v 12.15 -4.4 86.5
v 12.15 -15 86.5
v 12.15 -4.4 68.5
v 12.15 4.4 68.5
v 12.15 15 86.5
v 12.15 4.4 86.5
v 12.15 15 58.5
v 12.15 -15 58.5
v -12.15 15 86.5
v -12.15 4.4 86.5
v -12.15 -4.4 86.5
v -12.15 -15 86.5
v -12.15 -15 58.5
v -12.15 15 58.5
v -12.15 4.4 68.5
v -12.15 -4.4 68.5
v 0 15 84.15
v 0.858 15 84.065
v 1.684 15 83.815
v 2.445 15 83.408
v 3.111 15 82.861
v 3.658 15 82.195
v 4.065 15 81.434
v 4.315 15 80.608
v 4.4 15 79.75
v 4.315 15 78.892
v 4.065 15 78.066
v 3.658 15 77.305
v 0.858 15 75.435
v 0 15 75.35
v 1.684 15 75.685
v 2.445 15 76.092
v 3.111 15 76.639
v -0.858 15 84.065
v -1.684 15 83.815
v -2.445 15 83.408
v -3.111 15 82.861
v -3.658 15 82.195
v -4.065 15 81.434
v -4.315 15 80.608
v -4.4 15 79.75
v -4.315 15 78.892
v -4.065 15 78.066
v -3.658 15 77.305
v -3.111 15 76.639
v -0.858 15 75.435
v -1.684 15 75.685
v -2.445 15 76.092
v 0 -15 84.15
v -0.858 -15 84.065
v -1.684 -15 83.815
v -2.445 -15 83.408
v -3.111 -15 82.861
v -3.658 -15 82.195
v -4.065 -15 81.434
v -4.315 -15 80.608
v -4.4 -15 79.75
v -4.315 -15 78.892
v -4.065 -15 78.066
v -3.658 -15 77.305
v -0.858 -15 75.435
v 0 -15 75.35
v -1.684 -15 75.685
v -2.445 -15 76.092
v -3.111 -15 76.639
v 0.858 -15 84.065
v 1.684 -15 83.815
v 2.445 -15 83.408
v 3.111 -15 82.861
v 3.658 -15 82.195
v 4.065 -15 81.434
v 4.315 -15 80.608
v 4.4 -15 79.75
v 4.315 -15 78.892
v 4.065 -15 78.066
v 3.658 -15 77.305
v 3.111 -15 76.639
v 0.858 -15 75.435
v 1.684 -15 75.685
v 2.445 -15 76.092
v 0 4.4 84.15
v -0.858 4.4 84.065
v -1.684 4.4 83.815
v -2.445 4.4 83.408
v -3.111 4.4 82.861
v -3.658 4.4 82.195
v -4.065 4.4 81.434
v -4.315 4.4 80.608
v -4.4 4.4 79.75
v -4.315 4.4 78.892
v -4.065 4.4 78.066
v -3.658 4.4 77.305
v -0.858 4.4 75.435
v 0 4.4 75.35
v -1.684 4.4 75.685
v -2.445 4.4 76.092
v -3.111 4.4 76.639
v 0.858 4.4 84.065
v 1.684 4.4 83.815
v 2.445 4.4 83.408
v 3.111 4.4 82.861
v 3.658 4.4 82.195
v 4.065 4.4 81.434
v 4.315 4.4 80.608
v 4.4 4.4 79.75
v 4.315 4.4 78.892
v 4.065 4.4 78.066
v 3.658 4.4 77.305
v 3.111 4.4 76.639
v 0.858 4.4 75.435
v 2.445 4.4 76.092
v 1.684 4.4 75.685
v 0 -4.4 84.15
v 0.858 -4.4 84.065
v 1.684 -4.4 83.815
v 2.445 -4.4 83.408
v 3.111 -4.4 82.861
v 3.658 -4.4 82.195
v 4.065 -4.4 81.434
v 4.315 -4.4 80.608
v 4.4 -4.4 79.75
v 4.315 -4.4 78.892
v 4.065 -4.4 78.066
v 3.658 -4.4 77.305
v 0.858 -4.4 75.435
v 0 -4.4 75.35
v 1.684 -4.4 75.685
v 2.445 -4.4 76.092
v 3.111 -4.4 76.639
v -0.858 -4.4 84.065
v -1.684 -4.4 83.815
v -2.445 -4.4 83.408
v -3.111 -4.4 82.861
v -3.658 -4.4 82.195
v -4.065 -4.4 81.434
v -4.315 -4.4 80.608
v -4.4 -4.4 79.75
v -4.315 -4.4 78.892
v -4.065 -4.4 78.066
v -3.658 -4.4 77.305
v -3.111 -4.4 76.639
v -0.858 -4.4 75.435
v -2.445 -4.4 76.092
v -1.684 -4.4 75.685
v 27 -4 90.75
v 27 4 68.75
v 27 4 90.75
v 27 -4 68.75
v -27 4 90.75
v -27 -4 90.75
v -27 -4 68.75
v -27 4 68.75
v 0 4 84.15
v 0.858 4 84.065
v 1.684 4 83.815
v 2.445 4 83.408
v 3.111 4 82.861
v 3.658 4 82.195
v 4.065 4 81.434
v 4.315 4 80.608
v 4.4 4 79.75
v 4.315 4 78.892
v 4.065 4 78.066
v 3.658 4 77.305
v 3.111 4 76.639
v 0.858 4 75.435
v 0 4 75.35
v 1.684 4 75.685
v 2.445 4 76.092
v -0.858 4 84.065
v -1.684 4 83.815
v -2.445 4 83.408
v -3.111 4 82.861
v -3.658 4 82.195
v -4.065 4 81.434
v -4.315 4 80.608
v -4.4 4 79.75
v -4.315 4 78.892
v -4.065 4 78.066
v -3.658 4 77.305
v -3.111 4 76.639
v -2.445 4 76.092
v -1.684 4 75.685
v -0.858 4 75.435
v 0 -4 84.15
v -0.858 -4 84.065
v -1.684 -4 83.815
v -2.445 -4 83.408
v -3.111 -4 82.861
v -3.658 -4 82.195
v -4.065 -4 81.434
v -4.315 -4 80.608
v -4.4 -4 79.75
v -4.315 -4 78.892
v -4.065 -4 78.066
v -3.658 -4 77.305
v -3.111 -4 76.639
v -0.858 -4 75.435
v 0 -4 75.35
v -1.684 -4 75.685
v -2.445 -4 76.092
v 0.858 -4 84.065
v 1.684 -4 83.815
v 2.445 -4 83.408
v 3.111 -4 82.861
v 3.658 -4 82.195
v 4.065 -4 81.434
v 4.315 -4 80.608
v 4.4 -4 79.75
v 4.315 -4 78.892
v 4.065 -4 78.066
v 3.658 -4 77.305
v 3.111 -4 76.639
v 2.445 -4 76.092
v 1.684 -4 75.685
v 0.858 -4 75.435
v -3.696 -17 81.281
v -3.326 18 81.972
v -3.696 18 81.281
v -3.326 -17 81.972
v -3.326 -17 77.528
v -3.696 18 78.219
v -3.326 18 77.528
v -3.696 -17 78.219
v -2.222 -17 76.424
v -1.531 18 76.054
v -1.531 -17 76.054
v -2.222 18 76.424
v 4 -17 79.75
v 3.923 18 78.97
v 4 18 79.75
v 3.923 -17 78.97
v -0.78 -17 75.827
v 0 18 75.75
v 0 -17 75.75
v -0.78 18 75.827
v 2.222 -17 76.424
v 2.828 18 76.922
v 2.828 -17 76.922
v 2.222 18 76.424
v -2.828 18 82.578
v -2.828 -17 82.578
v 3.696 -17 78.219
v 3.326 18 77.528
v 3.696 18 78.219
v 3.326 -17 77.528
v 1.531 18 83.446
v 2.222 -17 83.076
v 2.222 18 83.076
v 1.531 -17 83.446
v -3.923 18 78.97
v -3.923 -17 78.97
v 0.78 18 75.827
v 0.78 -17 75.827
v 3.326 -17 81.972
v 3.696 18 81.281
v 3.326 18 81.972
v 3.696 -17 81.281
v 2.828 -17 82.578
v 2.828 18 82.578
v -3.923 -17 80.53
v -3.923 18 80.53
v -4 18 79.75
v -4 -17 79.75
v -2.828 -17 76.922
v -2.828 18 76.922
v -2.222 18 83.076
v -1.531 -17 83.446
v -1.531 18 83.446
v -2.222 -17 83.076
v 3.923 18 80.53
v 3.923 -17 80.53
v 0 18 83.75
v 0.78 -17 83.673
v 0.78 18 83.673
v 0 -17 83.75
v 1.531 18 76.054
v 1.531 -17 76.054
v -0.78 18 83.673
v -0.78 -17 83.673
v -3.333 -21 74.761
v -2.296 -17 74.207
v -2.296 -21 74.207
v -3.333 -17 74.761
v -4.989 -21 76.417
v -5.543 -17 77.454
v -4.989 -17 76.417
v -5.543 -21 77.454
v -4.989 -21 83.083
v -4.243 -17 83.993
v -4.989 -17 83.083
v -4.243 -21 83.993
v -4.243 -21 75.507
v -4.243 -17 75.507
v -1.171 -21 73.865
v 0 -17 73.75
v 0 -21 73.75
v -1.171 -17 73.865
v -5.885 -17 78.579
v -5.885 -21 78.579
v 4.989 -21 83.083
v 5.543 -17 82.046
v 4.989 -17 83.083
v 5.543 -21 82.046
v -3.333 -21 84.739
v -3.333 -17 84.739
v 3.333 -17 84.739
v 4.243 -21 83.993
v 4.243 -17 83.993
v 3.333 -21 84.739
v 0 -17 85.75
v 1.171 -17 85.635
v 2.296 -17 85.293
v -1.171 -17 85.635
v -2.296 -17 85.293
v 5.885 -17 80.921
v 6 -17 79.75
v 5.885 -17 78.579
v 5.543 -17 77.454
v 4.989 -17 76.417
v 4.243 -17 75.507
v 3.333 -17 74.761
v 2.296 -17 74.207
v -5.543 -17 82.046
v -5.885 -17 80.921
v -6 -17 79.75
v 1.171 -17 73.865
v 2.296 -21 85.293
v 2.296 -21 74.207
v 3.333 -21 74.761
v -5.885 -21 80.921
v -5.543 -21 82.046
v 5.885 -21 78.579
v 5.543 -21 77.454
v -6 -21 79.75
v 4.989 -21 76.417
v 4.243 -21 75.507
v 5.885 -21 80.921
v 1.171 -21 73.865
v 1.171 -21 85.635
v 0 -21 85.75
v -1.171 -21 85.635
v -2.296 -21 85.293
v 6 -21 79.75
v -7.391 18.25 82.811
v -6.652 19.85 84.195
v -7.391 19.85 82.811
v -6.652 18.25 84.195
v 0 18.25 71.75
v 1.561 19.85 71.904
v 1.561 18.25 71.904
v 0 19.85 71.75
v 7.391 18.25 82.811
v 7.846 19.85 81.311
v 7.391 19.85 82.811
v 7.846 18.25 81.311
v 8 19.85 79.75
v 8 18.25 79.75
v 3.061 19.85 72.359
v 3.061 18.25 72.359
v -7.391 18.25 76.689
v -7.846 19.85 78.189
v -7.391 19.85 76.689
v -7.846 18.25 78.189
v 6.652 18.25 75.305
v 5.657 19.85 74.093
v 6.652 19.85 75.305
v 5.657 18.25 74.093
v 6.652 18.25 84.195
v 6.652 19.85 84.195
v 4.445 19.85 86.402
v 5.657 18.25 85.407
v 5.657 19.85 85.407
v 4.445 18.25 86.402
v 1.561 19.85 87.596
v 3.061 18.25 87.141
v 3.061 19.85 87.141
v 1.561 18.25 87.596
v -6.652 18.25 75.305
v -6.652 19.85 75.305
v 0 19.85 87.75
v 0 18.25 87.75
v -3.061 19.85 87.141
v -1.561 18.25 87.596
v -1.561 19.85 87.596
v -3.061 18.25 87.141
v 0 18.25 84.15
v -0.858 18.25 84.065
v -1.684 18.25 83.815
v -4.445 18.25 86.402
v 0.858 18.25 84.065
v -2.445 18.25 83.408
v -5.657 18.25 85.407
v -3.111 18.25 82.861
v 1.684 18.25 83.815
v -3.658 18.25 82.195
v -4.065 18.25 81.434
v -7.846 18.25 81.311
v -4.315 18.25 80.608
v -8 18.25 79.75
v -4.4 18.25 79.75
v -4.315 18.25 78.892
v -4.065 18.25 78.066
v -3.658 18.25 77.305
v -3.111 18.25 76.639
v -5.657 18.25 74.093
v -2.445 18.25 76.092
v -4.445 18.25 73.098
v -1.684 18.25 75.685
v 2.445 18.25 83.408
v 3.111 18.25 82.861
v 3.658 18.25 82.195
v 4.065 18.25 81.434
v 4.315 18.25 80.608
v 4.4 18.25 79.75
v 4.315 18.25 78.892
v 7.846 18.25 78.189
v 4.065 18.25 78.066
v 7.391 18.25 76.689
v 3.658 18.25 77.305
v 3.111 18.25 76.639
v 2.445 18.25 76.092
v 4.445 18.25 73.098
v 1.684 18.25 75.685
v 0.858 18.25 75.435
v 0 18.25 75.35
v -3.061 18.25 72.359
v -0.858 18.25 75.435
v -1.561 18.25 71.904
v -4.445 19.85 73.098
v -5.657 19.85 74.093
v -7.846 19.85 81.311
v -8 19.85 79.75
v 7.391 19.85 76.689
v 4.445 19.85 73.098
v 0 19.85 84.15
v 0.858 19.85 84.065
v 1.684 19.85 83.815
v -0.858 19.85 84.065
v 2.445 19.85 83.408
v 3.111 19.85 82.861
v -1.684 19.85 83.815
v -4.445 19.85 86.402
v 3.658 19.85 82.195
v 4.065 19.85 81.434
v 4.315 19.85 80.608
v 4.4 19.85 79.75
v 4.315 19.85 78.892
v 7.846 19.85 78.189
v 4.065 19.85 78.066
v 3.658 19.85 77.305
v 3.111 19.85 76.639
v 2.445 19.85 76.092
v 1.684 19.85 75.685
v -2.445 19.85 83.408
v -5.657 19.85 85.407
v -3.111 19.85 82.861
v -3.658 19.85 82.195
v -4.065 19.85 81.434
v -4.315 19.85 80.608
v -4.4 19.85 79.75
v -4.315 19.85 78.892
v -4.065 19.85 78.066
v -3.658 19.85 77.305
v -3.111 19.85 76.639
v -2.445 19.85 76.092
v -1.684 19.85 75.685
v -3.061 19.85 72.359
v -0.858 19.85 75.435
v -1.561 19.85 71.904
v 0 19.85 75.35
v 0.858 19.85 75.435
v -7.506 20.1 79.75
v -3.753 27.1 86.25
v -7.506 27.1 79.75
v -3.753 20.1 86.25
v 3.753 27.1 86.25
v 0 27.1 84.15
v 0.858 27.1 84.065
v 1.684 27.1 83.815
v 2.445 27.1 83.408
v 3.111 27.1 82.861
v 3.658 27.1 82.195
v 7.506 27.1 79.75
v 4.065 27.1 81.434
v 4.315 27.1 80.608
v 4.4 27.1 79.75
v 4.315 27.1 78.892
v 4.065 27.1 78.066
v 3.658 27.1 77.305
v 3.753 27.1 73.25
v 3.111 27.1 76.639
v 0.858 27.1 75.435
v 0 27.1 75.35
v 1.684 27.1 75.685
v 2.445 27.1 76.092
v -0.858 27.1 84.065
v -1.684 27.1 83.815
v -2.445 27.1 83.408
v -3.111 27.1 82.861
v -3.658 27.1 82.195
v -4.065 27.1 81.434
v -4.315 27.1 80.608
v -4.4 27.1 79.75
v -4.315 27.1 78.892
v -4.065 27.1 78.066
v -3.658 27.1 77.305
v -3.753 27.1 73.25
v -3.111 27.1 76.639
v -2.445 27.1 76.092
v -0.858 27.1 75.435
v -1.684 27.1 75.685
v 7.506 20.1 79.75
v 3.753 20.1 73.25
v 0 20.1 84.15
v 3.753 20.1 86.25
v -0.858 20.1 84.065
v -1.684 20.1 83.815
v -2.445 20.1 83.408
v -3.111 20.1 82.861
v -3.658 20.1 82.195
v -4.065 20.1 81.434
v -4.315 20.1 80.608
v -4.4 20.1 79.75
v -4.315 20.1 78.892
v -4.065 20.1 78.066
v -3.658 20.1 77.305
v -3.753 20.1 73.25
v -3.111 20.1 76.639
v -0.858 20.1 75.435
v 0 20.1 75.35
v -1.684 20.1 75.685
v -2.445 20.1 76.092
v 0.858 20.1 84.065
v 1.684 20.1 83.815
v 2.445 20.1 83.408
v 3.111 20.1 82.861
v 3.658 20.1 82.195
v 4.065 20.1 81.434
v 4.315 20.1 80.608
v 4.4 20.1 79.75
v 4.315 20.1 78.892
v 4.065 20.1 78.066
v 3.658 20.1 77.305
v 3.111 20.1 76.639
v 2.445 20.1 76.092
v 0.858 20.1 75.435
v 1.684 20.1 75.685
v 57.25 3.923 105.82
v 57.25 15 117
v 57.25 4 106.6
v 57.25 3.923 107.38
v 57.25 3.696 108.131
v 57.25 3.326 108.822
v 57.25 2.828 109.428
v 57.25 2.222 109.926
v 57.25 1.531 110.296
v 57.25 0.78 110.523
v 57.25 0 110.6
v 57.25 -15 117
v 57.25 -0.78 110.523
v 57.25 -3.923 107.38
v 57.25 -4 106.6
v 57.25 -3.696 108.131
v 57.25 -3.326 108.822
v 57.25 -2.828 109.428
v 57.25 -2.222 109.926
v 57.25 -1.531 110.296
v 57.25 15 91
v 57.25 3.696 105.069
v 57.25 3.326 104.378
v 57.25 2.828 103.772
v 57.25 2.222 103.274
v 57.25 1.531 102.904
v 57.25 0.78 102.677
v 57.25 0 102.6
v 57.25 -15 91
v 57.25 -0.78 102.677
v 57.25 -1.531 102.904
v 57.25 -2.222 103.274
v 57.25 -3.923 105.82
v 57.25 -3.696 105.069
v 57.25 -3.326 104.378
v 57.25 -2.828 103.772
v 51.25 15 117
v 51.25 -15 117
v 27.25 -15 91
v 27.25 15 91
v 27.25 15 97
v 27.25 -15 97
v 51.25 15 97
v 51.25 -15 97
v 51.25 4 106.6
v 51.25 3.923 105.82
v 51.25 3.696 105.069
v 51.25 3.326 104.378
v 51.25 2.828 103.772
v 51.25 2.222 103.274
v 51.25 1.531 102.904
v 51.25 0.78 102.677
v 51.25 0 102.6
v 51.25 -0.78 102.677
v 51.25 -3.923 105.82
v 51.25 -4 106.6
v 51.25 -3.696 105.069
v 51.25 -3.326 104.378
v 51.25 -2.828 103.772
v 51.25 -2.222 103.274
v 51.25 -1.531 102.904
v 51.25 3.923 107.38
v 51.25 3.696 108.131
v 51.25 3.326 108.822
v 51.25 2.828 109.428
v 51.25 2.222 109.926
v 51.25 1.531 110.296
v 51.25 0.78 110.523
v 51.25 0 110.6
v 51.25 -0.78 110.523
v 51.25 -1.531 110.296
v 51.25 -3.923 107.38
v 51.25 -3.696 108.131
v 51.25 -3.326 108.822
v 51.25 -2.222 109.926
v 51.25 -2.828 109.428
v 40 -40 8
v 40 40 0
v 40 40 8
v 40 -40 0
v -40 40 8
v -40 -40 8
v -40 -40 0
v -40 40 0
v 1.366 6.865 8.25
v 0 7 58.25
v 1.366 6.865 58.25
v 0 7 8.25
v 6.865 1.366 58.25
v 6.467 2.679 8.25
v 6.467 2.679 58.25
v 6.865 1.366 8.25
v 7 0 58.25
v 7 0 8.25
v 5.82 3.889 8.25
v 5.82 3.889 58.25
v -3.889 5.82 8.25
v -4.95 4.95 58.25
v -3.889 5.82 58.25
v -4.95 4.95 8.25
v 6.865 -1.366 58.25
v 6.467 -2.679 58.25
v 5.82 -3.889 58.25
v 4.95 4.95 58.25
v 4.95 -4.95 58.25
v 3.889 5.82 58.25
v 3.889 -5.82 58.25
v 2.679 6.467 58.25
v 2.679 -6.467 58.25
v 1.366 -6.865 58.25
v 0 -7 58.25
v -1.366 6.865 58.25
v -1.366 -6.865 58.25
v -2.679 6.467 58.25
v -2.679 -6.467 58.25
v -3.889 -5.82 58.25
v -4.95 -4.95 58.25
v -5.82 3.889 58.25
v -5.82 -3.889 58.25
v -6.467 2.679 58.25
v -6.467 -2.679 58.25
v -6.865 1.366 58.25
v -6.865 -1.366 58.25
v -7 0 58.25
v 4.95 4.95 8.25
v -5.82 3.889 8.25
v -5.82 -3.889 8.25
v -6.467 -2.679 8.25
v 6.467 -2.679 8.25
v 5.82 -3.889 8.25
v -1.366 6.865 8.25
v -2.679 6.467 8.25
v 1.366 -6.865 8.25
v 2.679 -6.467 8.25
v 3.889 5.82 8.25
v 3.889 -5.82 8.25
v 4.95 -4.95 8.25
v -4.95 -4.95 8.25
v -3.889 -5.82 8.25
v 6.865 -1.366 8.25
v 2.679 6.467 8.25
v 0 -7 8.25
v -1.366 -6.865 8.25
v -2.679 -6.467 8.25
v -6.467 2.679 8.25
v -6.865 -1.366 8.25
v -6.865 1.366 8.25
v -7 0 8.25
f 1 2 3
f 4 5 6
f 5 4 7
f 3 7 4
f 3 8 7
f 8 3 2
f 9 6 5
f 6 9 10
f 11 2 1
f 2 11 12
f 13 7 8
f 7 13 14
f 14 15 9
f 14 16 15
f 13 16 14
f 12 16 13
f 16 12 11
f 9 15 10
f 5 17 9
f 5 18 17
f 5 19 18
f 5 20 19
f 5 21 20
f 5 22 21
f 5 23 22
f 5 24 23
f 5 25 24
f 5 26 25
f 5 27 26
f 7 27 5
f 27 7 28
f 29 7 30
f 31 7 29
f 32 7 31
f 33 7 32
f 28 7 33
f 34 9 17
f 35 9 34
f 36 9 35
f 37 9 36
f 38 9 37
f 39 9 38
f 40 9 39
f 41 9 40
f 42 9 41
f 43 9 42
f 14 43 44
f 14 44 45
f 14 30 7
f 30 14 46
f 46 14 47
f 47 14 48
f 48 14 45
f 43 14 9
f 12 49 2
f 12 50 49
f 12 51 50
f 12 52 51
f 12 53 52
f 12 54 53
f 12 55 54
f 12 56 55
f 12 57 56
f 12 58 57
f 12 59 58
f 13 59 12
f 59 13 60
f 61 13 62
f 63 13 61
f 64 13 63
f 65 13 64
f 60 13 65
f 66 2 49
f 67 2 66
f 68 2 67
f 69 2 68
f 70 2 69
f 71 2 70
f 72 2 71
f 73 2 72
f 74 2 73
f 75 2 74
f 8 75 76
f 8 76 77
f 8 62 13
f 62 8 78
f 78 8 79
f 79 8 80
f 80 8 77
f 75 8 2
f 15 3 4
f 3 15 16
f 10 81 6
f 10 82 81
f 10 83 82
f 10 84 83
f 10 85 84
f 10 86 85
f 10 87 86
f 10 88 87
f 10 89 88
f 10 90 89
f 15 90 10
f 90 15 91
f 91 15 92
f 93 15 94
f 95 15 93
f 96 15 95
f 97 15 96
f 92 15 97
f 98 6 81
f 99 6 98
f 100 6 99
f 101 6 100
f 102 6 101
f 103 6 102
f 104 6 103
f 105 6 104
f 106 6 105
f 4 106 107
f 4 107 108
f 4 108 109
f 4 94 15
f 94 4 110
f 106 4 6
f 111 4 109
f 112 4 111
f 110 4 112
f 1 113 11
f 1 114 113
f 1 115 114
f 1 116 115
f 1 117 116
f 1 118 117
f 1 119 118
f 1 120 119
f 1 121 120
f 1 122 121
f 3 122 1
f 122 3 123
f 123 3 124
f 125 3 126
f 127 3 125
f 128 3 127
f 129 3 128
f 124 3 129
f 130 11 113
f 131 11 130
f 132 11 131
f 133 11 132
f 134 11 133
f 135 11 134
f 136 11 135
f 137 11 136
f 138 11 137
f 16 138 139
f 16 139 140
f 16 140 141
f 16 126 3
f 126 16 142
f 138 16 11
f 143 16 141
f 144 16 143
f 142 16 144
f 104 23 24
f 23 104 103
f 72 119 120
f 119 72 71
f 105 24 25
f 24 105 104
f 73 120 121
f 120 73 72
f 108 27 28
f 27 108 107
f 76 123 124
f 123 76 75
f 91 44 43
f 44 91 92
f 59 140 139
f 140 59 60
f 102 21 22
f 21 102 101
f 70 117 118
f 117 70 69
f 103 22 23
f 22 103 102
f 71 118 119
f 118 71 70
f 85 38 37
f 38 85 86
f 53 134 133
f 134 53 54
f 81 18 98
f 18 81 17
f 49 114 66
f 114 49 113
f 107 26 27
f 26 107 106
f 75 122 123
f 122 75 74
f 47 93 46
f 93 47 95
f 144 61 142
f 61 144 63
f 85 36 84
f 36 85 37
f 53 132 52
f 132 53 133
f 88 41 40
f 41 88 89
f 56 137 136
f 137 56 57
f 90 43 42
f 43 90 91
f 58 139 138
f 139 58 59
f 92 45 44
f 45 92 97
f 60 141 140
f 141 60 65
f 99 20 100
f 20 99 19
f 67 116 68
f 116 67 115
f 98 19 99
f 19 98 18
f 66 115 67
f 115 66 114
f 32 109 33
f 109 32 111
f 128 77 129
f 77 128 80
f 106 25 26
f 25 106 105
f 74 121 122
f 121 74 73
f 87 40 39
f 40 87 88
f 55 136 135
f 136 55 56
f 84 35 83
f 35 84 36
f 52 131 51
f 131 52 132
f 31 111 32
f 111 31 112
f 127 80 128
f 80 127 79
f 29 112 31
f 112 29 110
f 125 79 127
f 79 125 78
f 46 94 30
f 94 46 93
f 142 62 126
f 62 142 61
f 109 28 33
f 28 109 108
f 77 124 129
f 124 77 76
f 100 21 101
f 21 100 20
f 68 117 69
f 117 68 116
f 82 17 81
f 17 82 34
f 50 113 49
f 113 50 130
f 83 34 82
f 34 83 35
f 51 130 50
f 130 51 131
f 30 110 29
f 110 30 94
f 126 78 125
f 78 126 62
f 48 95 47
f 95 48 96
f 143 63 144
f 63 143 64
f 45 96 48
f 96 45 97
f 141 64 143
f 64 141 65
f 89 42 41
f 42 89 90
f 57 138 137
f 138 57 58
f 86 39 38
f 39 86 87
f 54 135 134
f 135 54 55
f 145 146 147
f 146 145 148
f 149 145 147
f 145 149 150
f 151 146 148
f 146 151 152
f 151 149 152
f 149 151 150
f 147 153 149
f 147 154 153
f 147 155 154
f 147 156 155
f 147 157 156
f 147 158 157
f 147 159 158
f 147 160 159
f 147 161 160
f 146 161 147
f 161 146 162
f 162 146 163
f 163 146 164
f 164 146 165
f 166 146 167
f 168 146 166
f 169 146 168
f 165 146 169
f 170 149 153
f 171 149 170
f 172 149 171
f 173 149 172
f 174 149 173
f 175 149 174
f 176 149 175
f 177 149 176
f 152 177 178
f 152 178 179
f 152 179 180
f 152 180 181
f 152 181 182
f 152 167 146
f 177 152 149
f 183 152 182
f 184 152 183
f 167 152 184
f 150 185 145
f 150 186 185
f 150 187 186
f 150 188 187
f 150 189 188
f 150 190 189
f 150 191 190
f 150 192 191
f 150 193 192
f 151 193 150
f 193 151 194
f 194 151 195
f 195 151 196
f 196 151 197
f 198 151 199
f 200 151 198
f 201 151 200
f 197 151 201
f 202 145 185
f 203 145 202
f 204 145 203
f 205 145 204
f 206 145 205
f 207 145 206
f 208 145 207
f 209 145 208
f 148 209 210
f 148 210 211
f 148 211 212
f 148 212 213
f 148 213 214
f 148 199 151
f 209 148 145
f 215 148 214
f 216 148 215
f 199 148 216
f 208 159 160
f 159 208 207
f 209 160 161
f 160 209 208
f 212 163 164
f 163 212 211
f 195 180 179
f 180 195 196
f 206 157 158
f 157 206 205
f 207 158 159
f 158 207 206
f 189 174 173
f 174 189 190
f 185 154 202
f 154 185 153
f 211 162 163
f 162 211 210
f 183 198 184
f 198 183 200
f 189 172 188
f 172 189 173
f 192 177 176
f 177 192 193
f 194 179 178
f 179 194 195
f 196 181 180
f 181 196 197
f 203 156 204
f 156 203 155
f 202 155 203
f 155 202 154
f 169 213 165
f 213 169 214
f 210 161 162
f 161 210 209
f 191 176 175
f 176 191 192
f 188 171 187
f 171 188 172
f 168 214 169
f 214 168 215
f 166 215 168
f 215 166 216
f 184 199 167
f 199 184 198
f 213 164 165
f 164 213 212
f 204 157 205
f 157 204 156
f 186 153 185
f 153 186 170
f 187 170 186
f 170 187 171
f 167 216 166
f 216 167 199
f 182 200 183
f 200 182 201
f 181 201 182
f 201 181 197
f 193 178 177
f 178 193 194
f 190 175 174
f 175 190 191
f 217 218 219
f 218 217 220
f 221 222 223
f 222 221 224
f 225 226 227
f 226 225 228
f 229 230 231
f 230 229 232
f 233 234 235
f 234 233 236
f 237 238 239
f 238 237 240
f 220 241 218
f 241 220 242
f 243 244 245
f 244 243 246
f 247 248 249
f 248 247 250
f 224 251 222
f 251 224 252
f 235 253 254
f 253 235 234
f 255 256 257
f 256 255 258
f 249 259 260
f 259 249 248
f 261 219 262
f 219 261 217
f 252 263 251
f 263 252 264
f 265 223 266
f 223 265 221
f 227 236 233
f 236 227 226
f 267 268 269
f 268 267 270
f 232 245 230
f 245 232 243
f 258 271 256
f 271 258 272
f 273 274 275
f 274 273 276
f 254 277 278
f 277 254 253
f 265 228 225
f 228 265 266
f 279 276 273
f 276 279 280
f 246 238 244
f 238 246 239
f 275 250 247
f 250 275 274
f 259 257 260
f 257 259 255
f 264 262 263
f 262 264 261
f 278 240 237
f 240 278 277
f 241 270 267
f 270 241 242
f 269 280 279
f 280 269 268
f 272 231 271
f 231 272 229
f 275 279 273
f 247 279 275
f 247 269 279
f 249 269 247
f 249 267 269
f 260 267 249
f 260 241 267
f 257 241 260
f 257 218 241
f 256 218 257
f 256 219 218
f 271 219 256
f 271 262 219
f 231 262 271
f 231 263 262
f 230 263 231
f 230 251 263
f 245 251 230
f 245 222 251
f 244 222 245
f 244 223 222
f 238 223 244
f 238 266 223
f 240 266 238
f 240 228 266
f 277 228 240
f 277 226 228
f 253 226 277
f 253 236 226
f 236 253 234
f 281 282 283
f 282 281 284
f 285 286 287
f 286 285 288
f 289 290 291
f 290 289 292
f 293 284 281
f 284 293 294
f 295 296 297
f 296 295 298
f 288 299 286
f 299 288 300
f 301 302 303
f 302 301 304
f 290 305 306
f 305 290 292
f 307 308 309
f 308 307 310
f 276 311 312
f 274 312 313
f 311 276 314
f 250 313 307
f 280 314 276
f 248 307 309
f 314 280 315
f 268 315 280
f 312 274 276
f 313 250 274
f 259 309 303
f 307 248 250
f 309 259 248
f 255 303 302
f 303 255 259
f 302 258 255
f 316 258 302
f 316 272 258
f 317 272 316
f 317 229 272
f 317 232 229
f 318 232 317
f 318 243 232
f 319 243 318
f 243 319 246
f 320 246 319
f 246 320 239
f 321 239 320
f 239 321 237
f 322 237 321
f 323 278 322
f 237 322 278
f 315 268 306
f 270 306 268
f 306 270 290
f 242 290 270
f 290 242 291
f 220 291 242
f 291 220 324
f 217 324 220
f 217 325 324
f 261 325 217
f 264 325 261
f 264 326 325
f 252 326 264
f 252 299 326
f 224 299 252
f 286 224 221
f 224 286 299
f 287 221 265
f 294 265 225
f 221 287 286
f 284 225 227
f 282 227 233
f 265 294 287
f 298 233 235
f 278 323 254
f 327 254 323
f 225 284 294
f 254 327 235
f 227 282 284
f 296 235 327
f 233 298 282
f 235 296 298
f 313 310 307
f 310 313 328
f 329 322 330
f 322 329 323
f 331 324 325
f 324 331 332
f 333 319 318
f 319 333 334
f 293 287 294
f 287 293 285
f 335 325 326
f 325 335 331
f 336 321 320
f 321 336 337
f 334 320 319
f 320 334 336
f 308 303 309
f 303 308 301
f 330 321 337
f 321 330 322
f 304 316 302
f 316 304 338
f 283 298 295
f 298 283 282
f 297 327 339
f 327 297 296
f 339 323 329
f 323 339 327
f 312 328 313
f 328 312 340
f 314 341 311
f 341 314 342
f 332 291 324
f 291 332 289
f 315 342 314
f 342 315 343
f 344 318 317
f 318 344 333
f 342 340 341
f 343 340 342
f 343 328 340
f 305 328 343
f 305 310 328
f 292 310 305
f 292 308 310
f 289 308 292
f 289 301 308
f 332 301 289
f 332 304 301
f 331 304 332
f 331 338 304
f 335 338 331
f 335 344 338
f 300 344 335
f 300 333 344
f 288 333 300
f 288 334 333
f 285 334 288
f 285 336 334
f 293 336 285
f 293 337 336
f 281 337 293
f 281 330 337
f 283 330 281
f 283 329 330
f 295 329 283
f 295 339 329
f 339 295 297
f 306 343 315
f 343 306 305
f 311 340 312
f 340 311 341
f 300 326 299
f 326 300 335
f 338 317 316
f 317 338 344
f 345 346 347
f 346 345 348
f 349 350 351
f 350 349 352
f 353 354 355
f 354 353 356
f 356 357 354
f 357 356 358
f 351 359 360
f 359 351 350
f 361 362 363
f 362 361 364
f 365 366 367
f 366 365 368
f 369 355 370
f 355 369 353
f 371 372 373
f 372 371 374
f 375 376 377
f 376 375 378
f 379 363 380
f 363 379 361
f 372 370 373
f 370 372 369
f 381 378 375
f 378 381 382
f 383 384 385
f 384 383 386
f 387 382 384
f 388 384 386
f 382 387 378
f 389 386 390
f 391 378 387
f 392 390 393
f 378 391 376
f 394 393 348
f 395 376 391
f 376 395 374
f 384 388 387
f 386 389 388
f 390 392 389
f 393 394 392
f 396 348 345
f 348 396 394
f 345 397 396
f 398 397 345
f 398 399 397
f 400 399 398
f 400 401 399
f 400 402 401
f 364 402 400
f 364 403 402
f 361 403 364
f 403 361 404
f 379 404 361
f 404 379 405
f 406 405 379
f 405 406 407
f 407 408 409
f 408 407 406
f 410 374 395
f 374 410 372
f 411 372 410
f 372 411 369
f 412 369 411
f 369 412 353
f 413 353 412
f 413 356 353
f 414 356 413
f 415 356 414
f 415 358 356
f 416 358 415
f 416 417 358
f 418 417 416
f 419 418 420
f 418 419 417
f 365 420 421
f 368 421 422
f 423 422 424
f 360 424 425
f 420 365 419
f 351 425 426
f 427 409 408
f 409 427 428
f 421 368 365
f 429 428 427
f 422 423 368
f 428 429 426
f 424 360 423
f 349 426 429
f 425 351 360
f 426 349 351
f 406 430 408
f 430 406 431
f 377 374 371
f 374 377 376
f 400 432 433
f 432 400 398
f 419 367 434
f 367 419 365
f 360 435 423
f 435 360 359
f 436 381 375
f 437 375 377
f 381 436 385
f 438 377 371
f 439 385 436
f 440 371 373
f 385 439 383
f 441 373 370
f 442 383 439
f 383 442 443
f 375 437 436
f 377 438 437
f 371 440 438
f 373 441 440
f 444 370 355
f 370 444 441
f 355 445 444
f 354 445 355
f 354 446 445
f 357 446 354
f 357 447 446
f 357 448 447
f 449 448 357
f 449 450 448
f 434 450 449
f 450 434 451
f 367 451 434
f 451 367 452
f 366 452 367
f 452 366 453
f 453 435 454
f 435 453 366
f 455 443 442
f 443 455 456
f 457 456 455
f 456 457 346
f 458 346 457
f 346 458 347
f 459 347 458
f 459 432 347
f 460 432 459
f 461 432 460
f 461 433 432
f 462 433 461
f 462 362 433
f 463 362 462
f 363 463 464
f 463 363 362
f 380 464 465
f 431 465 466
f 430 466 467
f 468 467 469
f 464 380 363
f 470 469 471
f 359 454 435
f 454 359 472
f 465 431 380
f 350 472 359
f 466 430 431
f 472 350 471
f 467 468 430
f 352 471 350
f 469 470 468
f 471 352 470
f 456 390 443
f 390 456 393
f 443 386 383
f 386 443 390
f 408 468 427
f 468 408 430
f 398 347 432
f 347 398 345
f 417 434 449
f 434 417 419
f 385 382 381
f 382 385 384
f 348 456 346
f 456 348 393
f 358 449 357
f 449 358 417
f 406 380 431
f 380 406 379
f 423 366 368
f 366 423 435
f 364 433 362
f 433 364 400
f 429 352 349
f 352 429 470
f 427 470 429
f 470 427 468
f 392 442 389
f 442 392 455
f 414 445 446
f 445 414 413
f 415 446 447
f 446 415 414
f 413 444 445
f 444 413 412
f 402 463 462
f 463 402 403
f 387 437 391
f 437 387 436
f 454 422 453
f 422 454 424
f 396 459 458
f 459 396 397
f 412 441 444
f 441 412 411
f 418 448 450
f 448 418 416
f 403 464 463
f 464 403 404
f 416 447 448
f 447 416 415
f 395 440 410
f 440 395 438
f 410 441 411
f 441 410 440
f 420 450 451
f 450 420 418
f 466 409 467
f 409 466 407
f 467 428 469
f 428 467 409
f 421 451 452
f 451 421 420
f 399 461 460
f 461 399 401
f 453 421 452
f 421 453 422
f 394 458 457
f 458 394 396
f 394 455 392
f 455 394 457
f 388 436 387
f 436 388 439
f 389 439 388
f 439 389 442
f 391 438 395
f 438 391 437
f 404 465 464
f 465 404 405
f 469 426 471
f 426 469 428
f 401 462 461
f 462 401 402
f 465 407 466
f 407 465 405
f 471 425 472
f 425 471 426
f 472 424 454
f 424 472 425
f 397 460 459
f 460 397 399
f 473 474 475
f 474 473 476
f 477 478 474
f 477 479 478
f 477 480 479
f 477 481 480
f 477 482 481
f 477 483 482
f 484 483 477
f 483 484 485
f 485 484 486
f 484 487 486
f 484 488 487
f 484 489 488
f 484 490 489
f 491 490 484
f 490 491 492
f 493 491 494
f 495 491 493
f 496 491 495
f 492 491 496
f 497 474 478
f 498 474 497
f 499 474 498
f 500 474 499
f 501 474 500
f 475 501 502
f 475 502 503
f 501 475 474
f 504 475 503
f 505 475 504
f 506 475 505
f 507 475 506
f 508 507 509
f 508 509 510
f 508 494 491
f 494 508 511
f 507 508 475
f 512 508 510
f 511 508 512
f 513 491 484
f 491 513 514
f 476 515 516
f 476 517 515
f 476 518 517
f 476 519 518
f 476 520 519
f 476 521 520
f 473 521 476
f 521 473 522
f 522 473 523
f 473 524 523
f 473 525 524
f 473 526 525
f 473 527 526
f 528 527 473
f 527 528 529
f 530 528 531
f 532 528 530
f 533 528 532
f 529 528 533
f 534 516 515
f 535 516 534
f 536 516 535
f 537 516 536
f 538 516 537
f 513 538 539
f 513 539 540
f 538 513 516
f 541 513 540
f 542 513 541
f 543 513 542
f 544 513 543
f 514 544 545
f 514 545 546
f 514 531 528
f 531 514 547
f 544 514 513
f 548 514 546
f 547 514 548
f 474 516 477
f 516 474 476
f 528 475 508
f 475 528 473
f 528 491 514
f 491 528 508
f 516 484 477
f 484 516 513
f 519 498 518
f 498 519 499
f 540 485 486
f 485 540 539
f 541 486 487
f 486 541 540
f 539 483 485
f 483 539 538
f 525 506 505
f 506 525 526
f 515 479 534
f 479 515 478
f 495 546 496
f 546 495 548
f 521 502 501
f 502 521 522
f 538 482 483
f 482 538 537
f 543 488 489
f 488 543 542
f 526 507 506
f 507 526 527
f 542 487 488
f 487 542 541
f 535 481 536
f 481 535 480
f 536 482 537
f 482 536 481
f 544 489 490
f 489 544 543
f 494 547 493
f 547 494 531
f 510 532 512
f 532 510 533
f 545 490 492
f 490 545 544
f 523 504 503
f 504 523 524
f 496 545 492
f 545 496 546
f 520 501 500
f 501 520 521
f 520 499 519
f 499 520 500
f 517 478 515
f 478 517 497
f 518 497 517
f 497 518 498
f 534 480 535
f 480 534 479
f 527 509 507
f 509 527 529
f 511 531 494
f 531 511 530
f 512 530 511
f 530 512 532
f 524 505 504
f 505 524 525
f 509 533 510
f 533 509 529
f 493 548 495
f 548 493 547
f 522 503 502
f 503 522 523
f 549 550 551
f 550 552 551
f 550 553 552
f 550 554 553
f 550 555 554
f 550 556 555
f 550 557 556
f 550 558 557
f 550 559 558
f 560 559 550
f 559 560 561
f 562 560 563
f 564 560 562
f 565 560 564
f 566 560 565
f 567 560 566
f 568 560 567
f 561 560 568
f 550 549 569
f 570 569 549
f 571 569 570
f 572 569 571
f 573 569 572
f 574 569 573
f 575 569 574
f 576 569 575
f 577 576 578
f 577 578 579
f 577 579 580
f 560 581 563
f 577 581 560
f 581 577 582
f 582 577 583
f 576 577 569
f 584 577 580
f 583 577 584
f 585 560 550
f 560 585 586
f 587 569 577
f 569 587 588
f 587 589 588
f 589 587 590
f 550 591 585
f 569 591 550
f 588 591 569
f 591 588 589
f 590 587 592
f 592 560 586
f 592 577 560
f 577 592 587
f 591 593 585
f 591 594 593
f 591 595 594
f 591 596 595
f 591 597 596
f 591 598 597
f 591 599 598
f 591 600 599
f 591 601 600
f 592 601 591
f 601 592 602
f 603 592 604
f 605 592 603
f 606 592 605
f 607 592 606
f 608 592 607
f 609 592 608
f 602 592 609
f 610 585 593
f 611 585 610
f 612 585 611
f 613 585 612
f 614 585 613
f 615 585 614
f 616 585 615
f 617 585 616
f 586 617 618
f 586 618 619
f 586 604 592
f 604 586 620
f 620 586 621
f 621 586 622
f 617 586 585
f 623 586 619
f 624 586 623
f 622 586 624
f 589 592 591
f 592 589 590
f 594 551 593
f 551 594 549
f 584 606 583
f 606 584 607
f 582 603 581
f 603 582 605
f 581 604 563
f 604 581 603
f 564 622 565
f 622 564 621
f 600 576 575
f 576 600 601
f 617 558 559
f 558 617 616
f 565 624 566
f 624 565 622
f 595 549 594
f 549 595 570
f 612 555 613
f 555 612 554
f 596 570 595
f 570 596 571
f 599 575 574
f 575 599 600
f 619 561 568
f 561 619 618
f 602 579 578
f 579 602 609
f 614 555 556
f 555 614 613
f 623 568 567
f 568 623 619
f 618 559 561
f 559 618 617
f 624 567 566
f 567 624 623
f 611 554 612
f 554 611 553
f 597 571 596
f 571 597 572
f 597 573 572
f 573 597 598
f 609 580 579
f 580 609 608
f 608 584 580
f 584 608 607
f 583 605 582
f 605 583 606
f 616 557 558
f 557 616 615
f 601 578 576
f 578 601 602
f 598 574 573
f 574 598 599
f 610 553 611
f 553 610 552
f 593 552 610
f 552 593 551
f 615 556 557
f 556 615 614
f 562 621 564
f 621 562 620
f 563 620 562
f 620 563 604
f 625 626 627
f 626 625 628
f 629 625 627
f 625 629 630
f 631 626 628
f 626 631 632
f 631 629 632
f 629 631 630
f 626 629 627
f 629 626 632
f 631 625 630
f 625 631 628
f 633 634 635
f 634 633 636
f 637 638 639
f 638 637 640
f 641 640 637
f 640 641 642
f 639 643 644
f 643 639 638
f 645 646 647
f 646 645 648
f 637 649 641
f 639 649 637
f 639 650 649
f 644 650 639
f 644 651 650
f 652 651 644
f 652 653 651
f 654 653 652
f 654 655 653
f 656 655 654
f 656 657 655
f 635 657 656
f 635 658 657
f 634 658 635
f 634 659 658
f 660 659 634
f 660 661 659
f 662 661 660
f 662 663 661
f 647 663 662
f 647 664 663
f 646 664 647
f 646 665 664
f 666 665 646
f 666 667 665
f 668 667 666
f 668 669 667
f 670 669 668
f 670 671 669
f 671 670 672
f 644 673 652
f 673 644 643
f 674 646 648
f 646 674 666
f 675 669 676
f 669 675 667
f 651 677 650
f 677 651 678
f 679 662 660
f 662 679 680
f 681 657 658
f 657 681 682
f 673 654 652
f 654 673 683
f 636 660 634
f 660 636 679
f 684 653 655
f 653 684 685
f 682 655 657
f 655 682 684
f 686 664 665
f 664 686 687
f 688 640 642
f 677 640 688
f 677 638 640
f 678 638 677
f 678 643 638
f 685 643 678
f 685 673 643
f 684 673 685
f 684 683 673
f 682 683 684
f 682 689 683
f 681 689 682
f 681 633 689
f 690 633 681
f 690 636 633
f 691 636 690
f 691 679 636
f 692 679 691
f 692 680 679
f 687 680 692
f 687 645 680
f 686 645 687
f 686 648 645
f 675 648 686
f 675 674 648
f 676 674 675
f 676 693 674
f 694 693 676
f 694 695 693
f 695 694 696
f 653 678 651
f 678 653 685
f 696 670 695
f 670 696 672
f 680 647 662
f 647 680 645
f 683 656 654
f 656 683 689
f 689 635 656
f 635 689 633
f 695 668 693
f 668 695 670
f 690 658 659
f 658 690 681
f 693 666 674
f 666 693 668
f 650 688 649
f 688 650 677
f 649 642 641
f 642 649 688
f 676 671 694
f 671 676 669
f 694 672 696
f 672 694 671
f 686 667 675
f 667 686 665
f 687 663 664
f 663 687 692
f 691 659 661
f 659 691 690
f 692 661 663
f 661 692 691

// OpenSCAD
$fn = 32;

// ------------------------------------------------------------------------
// Lamp arm: column d14 x 50 mm, arm 54 mm
// Every part is its own module, assembly() places every instance.
// ------------------------------------------------------------------------

// --- part 1 ---
module lamp_base() {
  difference() {
    translate([-40, -40, 0]) cube([80, 80, 8]);
  }
}

// --- part 2 ---
module lamp_column() {
  cylinder(h = 50, d = 14);
}

// --- part 3 ---
module head_fork() {
  difference() {
    translate([-12.15, -15, 0]) cube([24.3, 30, 28]);
    translate([-13.15, -4.4, 10]) cube([26.3, 8.8, 19]);
    translate([0, 0, 21.25]) rotate([90, 0, 0]) cylinder(h = 32, d = 8.8, center = true);
  }
}

// --- part 4 ---
module lamp_arm() {
  difference() {
    translate([-27, -4, 0]) cube([54, 8, 22]);
    translate([0, 0, 11]) rotate([90, 0, 0]) cylinder(h = 10, d = 8.8, center = true);
  }
}

// --- part 5 ---
module arm_pin() {
  rotate([0, 90, 0]) cylinder(h = 36, d = 8, center = true);
  translate([-21, 0, 0]) rotate([0, 90, 0]) cylinder(h = 4, d = 12);
}

// --- part 6 ---
module arm_washer() {
  difference() {
      translate([0, 0, 0]) cylinder(h = 1.6, d = 16);
      translate([0, 0, -1]) cylinder(h = 3.6, d = 8.8);
    }
}

// --- part 7 ---
module arm_nut() {
  difference() {
    linear_extrude(height = 7) polygon(points = [[7.506, 0], [3.753, 6.5], [-3.753, 6.5], [-7.506, 0], [-3.753, -6.5], [3.753, -6.5]]);
    translate([0, 0, -1]) cylinder(h = 9, d = 8.8);
  }
}

// --- part 8 ---
module shade_bracket() {
  difference() {
    translate([-15, -15, 0]) cube([30, 30, 26]);
    translate([-16, -16, 6]) cube([25, 32, 21]);
    translate([12, 0, 15.6]) rotate([0, 90, 0]) cylinder(h = 8, d = 8, center = true);
  }
}

// --- assembly ---
module assembly() {
  color([0.80, 0.24, 0.20]) translate([0, 0, 0]) rotate([0, 0, 0]) lamp_base();
  color([0.20, 0.45, 0.75]) translate([0, 0, 8.25]) rotate([0, 0, 0]) lamp_column();
  color([0.25, 0.62, 0.32]) translate([0, 0, 58.5]) rotate([0, 0, 0]) head_fork();
  color([0.92, 0.70, 0.18]) translate([0, 0, 68.75]) rotate([0, 0, 0]) lamp_arm();
  color([0.58, 0.35, 0.70]) translate([0, 0, 79.75]) rotate([0, 0, 90]) arm_pin();
  color([0.16, 0.66, 0.66]) translate([0, 19.85, 79.75]) rotate([90, 0, 0]) arm_washer();
  color([0.85, 0.48, 0.18]) translate([0, 27.1, 79.75]) rotate([90, 0, 0]) arm_nut();
  color([0.55, 0.60, 0.65]) translate([42.25, 0, 91]) rotate([0, 0, 0]) shade_bracket();
}

assembly();
